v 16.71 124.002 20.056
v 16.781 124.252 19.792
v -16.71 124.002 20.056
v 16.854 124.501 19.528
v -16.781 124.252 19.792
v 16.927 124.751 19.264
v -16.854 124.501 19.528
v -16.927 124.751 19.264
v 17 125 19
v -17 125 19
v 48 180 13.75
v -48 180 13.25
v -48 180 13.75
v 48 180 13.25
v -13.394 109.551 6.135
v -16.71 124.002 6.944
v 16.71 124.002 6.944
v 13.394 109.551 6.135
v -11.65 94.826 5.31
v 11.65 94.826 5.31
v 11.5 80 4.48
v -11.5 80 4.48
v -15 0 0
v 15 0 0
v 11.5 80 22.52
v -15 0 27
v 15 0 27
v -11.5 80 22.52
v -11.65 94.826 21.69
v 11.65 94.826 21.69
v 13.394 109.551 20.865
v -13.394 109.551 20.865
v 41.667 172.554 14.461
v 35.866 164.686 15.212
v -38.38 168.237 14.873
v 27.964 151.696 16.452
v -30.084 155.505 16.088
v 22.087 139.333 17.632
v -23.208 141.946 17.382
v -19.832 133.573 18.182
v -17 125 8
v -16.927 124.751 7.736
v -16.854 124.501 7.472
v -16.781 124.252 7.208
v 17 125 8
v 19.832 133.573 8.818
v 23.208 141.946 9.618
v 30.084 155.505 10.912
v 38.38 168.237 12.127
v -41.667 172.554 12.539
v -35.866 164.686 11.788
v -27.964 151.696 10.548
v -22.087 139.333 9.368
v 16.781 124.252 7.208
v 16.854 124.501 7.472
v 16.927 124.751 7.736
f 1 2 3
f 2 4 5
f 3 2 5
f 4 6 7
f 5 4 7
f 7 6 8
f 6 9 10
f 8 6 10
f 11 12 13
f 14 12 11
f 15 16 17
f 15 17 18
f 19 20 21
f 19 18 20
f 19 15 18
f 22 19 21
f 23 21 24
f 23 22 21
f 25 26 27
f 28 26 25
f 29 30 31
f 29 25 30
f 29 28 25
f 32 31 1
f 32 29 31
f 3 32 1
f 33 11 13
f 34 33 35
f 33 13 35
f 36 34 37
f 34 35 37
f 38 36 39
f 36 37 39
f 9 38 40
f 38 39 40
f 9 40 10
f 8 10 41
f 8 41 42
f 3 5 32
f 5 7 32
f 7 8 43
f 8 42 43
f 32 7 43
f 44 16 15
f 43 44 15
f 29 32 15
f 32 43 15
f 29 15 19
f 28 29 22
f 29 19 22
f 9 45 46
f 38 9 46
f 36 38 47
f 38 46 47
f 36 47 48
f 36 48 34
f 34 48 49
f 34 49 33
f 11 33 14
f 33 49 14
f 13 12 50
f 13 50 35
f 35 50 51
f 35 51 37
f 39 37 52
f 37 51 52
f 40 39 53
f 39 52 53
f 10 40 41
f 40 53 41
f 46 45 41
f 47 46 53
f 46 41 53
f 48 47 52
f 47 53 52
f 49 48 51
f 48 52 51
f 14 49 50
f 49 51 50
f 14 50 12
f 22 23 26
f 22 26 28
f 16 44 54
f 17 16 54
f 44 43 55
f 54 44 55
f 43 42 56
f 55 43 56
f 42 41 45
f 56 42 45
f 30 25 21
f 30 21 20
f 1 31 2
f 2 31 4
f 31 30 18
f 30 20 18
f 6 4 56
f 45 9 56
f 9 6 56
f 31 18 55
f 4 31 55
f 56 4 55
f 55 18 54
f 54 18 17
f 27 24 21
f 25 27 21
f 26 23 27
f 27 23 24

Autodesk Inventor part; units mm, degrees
ref_plane "YZ Plane" through (0, 0, 0) normal (1, 0, 0) x (0, 1, 0)
ref_plane "XZ Plane" through (0, 0, 0) normal (0, 1, 0) x (-1, 0, 0)
ref_plane "XY Plane" through (0, 0, 0) normal (0, 0, 1) x (1, 0, 0)
sketch "Эскиз1" plane through (0, 0, 0) normal (0, 0, 1) x (1, 0, 0)
  line L0 (-15, 0) -> (15, 0)
  line L1 (0, 120) -> (0, 125)
  line L2 (0, 125) -> (0, 180)
  line L3 (-48, 180) -> (48, 180)
  line L4 (-17, 125) -> (17, 125)
  line L5 (-15, 120) -> (15, 120)
  line L6 (0, 0) -> (0, 80)
  line L7 (0, 80) -> (0, 120)
  line L8 (-11.5, 80) -> (11.5, 80)
  line L9 (15, 0) -> (11.5, 80)
  line L10 (-15, 0) -> (-11.5, 80)
  arc A0 (17, 125) -> (11.5, 80) centre (149.09, 86.0196) ccw
  arc A1 (48, 180) -> (17, 125) centre (151.9429, 85.1776) ccw
  arc A2 (-11.5, 80) -> (-17, 125) centre (-149.09, 86.0196) ccw
  arc A3 (-17, 125) -> (-48, 180) centre (-151.9429, 85.1776) ccw
  dimension "d0" = 30
  dimension "d2" = 5
  dimension "d3" = 55
  dimension "d4" = 96
  dimension "d5" = 34
  dimension "d6" = 30
  dimension "d7" = 80
  dimension "d8" = 40
  dimension "d9" = 23
extrude "Выдавливание1" add sketch "Эскиз1" along normal blind 27
sketch "Эскиз2" plane through (0, 0, 0) normal (1, 0, 0) x (0, 1, 0)
  line L0 (80, 0) -> (0, 0) projected
  line L1 (0, 0) -> (0, 27) projected
  line L2 (80, 27) -> (0, 27) projected
  line L3 (80, 0) -> (80, 27) projected
  line L4 (125, 0) -> (80, 0) projected
  line L5 (80, 0) -> (80, 27) projected
  line L6 (125, 27) -> (80, 27) projected
  line L7 (125, 0) -> (125, 27) projected
  line L8 (180, 0) -> (125, 0) projected
  line L9 (125, 0) -> (125, 27) projected
  line L10 (180, 27) -> (125, 27) projected
  line L11 (180, 0) -> (180, 27) projected
  line L12 (125, 7) -> (125, 20)
  line L13 (125, 0) -> (125, 27) projected
  line L14 (125, 7) -> (0, 0)
  line L15 (0, 27) -> (125, 20)
  line L16 (125, 8) -> (125, 19)
  line L17 (180, 13.25) -> (180, 13.75)
  line L18 (180, 0) -> (180, 27) projected
  line L19 (125, 8) -> (180, 13.25)
  line L20 (180, 13.75) -> (125, 19)
  point P0 (125, 13.5)
  point P1 (125, 13.5)
  point P2 (180, 13.5)
  dimension "d12" = 13
  dimension "d13" = 11
  dimension "d14" = 0.5
extrude "Выдавливание2" cut sketch "Эскиз2" along normal mid plane 100 contours L1 L15 L3 L14 | L3 L15 L7 L14 | L7 L20 L11 L19 keep common part
chamfer "Фаска1" distance 1 angle 45 2 edges at (0, 125, 7) (0, 125, 20)
equation "\"d6\" = d0"
properties part number "bachi"
